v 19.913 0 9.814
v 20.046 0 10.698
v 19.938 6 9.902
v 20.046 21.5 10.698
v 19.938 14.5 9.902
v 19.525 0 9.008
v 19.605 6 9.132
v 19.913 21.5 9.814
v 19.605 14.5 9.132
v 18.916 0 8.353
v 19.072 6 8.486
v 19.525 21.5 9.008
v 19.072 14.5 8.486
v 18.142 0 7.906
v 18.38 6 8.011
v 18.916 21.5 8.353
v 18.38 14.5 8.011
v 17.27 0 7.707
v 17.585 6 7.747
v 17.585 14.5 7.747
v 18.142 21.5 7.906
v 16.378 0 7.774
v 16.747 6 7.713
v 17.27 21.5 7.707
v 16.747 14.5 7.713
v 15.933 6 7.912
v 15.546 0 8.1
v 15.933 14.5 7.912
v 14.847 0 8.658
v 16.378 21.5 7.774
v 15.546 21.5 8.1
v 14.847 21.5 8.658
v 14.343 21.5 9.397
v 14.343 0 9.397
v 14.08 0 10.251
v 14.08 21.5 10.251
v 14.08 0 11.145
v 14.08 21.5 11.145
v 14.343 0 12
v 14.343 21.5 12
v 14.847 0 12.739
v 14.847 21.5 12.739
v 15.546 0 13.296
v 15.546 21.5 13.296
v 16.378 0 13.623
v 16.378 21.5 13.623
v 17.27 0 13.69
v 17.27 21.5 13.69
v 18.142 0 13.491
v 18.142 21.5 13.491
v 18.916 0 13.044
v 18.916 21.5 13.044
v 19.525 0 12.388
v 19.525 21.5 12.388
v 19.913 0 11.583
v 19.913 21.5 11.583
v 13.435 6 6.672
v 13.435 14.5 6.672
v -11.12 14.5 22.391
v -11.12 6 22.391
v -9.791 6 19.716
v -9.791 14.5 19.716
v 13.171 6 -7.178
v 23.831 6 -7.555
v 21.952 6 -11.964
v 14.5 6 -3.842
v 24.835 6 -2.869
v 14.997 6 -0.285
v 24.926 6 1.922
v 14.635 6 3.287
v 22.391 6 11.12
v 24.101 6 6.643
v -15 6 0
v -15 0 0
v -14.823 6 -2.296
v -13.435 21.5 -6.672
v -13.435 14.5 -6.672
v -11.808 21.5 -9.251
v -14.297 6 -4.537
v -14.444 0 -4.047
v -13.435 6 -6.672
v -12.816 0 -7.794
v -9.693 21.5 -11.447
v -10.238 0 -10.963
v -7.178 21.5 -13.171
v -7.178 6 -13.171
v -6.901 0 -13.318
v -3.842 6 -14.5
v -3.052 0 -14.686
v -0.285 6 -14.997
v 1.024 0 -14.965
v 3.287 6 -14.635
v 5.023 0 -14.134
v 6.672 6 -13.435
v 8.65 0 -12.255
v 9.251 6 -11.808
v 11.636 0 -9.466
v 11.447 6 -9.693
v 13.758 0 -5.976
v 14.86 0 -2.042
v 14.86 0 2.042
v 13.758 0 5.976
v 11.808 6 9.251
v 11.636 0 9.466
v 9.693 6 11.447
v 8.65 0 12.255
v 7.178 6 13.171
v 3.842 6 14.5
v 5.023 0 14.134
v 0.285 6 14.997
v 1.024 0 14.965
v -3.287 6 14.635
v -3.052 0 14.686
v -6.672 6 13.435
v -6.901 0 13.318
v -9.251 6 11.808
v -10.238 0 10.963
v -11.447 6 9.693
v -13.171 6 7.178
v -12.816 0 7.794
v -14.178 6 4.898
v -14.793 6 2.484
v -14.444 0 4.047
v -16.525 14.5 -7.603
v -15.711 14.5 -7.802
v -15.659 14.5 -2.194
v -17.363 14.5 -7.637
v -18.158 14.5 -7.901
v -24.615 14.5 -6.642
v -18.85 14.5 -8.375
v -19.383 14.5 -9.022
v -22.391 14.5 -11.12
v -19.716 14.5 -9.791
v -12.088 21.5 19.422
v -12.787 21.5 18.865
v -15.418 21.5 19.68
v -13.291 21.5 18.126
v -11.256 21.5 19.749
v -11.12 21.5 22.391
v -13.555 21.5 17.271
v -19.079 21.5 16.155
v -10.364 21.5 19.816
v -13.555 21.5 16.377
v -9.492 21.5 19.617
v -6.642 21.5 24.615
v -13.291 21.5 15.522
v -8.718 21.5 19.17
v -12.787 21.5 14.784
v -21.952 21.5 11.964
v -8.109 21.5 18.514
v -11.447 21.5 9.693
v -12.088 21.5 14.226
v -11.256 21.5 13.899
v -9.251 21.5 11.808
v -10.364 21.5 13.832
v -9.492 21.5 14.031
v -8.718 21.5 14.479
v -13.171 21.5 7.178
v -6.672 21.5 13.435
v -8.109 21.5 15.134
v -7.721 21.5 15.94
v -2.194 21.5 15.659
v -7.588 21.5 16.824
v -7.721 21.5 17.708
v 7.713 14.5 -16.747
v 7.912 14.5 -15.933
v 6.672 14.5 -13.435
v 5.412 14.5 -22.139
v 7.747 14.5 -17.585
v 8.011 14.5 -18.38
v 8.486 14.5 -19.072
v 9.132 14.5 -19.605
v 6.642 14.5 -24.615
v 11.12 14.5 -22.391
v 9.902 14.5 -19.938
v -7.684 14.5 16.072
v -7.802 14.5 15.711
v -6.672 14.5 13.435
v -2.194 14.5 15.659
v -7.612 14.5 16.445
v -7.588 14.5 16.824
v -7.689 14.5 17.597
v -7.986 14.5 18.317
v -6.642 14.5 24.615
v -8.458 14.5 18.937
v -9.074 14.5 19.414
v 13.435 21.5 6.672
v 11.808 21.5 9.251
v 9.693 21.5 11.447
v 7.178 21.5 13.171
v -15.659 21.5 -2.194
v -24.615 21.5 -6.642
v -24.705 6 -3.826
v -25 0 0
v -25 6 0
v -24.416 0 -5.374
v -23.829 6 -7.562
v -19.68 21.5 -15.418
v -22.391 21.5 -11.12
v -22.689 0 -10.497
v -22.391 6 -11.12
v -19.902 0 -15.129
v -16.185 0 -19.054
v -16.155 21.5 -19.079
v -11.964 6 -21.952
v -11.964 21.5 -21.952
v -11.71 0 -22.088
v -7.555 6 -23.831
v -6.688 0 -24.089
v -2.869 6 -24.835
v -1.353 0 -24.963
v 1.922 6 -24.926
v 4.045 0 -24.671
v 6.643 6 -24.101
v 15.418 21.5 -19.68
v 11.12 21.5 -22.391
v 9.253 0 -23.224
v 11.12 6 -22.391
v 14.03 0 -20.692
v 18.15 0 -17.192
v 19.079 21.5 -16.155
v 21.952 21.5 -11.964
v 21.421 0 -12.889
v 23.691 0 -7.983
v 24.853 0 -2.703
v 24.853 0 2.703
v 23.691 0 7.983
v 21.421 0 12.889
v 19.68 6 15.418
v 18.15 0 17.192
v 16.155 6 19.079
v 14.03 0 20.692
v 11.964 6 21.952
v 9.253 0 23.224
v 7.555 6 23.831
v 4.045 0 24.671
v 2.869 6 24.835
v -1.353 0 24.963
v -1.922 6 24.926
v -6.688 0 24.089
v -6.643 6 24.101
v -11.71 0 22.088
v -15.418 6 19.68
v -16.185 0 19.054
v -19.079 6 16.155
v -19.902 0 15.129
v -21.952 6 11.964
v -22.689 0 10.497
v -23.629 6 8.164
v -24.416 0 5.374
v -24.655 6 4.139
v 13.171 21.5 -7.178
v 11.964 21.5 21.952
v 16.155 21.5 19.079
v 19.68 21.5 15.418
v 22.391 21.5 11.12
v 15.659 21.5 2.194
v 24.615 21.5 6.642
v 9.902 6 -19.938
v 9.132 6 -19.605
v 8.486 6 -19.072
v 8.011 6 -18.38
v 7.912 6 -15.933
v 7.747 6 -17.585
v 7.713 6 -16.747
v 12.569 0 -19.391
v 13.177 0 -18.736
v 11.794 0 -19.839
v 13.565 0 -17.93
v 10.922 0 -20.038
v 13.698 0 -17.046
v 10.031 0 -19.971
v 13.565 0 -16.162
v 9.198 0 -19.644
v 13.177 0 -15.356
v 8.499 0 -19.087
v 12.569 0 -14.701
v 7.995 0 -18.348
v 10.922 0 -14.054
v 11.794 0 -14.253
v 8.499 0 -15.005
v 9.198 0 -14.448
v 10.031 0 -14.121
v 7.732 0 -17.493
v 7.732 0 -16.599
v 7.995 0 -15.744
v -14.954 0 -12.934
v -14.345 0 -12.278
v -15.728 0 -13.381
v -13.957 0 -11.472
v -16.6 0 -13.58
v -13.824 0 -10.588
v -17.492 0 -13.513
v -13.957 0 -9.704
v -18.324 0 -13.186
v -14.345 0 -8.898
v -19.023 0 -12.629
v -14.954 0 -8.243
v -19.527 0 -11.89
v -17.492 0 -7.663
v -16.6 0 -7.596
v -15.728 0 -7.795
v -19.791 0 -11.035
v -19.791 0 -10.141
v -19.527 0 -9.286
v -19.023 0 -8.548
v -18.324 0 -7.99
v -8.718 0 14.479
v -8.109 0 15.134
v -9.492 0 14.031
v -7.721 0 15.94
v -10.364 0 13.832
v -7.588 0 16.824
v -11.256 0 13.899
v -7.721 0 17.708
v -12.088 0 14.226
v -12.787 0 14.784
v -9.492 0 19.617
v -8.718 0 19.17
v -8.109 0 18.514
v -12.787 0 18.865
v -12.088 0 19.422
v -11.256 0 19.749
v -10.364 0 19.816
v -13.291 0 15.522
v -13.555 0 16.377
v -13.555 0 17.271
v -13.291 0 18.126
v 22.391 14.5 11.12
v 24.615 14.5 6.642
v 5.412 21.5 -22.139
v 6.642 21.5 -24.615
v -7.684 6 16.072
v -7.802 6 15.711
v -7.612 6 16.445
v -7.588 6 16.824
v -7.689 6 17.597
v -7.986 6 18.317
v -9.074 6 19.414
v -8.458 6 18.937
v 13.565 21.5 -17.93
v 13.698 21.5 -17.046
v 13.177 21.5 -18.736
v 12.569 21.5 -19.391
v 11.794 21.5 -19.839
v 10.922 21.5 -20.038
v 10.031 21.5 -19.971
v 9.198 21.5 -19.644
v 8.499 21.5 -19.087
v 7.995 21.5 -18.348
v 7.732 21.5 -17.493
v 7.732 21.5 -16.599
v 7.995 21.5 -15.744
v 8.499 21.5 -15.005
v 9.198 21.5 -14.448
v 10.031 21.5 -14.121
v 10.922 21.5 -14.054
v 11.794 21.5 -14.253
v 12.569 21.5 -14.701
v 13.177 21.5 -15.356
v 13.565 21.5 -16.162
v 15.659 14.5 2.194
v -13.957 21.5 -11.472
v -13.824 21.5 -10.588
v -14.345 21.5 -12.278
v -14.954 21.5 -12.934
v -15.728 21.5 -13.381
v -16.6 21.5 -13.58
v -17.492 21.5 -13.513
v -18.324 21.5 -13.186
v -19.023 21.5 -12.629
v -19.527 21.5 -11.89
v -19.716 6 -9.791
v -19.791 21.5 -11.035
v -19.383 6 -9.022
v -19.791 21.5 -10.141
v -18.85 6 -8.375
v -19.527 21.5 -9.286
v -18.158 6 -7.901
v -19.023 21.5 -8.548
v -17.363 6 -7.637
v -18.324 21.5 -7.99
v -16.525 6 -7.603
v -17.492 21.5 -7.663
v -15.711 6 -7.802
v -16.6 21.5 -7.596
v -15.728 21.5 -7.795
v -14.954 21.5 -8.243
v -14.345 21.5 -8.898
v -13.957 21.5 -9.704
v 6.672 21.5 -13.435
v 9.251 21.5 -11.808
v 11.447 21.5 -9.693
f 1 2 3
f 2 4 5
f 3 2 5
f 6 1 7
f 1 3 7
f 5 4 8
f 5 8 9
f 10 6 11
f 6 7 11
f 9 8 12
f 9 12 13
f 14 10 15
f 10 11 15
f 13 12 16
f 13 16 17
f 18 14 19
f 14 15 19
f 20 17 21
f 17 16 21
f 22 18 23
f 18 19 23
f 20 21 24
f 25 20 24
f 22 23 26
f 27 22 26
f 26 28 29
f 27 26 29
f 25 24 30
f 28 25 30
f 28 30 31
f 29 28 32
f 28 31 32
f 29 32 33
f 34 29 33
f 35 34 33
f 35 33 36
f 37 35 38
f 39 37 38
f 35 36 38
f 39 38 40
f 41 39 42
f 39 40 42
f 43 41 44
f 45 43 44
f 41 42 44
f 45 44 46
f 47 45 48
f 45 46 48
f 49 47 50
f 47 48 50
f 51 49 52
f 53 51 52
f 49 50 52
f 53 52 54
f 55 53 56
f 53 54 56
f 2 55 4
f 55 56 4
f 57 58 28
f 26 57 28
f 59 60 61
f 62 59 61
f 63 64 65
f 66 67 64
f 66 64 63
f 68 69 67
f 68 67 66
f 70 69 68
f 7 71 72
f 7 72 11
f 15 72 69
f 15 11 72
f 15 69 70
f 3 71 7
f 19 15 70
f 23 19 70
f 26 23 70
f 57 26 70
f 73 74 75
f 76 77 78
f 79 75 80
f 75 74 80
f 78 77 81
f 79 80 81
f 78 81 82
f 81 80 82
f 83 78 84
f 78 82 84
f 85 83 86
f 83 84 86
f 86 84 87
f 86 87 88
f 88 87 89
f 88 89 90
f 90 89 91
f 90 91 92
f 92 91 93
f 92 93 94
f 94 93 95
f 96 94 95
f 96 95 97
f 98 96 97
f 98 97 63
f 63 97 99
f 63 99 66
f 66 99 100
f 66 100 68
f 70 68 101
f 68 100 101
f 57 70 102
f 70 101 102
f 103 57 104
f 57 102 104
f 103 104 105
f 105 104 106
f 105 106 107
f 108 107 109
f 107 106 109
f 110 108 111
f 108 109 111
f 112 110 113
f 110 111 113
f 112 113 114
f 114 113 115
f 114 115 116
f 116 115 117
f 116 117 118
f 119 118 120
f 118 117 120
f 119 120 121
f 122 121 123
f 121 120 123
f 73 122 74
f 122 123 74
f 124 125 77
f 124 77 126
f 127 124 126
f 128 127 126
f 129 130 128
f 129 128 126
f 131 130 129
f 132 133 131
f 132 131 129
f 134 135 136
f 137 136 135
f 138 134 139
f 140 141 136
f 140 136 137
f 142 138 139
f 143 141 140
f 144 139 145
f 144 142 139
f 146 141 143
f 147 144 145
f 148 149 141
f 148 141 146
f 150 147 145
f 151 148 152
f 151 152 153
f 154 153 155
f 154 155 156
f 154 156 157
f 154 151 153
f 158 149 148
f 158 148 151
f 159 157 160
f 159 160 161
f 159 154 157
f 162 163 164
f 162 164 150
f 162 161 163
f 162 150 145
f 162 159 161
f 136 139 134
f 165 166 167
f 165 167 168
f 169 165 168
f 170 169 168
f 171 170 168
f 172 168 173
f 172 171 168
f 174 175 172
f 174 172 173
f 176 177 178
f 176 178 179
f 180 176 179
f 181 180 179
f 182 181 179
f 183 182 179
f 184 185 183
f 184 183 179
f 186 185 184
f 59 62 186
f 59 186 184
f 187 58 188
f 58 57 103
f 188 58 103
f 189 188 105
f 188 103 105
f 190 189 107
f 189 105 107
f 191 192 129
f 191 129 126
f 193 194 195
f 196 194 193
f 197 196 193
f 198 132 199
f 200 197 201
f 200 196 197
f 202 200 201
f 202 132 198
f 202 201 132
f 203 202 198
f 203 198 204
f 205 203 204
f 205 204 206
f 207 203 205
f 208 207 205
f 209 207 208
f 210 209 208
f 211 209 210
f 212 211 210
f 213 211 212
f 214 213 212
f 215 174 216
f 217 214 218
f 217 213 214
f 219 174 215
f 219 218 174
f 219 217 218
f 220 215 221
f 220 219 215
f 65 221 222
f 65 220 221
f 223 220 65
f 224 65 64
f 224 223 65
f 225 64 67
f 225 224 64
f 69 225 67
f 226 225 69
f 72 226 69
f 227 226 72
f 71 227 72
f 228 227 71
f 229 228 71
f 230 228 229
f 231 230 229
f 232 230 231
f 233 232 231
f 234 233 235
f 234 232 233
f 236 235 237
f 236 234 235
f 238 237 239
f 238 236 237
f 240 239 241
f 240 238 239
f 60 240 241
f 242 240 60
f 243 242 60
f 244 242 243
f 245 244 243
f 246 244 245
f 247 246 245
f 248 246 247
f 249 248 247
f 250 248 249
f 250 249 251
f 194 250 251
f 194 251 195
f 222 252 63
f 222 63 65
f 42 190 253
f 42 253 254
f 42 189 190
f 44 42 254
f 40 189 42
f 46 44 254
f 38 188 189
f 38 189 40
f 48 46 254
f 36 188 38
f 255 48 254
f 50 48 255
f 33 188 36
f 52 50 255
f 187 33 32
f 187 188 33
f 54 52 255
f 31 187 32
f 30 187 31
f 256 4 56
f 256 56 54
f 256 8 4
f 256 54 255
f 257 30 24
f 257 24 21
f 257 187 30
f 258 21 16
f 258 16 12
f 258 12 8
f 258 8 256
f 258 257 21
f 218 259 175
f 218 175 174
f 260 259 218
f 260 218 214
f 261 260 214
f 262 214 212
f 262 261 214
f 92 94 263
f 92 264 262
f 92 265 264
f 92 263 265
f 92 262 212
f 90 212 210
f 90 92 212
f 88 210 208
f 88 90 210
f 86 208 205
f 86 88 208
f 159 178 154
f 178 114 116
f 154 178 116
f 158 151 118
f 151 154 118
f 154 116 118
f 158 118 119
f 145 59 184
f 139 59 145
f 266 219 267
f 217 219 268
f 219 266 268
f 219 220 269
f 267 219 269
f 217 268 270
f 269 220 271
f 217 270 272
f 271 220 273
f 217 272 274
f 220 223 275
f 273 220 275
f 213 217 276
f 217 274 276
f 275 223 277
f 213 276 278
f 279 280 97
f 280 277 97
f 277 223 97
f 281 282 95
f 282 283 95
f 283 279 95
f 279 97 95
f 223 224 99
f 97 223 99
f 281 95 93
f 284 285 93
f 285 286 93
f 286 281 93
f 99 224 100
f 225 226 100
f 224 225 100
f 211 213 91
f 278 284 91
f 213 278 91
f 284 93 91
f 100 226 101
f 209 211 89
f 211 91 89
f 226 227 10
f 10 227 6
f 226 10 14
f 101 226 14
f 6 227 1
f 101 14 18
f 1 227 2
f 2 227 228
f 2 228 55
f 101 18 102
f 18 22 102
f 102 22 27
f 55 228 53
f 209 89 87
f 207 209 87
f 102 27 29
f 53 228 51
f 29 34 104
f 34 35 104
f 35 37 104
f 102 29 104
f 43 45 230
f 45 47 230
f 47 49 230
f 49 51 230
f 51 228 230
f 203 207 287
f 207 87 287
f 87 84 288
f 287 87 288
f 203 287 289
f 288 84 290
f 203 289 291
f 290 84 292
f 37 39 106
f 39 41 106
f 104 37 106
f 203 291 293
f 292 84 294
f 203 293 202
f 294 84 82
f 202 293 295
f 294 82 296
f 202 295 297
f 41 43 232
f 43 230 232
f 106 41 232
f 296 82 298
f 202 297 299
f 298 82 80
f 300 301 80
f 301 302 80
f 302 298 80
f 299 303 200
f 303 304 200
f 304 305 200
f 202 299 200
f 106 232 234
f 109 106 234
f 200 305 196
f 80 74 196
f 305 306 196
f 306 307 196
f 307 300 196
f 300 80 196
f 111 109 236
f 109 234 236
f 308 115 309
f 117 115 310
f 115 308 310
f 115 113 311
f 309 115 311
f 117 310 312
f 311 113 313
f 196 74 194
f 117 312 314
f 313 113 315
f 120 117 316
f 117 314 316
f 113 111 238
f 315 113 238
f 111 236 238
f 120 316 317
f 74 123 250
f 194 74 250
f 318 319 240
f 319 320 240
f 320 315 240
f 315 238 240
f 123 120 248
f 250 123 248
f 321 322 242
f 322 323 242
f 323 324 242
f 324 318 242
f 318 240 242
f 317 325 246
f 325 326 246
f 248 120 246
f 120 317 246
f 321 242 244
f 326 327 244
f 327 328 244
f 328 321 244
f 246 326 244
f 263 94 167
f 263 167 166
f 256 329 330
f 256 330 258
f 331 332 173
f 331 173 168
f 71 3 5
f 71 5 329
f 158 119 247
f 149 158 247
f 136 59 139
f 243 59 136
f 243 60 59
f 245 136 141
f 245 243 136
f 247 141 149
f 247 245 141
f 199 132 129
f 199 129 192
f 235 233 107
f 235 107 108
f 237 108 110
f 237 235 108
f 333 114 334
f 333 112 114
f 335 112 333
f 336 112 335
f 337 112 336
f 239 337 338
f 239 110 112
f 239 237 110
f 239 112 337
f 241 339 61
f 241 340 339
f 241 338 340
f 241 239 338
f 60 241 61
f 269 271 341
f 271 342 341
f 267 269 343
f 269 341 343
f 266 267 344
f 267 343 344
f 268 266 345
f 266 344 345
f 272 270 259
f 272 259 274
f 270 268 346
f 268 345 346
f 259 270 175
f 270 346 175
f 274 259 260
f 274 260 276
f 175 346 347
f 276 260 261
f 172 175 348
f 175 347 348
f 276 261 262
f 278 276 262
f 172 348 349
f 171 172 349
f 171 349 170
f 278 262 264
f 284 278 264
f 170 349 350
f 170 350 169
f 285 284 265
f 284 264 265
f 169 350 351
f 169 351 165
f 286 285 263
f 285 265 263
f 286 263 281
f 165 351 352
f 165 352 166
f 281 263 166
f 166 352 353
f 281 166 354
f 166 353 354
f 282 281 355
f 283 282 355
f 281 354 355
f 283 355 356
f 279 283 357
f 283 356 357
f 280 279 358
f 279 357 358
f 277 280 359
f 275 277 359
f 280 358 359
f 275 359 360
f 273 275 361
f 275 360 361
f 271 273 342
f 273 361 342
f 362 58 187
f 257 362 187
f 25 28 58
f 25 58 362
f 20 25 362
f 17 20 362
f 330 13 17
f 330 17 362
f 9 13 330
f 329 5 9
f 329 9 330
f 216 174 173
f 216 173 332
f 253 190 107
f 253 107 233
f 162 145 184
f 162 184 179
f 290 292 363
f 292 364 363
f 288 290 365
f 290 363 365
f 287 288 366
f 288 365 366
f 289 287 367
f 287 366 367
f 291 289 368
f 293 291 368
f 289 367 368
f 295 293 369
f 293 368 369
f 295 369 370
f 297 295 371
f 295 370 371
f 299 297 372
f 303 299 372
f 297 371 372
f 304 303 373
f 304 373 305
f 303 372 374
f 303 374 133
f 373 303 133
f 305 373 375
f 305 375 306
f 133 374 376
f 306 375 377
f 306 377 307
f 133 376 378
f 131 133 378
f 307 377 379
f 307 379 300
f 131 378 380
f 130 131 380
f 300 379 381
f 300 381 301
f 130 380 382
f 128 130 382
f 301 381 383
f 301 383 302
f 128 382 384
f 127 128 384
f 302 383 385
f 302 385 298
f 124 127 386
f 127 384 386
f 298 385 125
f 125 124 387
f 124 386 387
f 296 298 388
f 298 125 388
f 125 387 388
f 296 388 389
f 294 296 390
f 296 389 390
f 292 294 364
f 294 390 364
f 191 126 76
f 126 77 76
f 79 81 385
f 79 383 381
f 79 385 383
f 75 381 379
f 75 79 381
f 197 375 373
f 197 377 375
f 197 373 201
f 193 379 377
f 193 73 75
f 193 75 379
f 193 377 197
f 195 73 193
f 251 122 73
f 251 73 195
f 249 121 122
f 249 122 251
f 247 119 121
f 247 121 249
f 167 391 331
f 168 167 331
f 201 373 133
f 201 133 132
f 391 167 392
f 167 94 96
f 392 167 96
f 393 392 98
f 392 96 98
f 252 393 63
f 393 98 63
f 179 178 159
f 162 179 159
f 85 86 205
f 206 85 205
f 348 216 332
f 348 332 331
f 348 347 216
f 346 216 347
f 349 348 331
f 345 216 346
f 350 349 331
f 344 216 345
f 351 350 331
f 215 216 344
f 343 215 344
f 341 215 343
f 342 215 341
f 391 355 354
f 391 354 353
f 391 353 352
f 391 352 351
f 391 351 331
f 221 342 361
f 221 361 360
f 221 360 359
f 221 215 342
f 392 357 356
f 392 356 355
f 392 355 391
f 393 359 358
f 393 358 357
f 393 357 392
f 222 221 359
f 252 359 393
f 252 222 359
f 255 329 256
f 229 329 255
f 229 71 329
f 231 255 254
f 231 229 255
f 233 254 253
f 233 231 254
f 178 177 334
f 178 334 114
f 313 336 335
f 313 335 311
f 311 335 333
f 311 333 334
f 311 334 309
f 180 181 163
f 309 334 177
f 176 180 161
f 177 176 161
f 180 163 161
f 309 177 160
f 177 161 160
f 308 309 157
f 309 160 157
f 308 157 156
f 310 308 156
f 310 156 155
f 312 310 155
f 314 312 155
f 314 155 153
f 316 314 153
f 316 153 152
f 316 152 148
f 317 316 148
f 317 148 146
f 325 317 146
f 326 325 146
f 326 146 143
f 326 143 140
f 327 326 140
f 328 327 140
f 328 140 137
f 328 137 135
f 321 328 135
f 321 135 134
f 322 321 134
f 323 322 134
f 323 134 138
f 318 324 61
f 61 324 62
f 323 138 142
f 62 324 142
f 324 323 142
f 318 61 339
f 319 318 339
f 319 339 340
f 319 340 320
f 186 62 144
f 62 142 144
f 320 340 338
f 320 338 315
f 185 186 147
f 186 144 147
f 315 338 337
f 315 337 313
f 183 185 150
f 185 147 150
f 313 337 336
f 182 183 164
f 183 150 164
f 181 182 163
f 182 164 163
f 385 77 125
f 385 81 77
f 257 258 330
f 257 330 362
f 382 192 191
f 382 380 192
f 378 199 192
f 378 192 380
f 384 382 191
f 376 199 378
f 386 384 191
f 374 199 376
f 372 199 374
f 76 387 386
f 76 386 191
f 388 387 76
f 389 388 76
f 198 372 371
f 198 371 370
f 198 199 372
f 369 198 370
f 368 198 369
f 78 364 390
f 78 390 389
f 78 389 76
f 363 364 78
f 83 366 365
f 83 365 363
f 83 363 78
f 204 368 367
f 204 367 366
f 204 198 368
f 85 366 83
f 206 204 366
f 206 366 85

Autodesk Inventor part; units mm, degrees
ref_plane "YZ Plane" through (0, 0, 0) normal (1, 0, 0) x (0, 1, 0)
ref_plane "XZ Plane" through (0, 0, 0) normal (0, 1, 0) x (-1, 0, 0)
ref_plane "XY Plane" through (0, 0, 0) normal (0, 0, 1) x (1, 0, 0)
sketch "Sketch1" plane through (0, 0, 0) normal (0, 1, 0) x (-1, 0, 0)
  circle A0 centre (0, 0) radius 25
  circle A1 centre (0, 0) radius 15
  dimension "d0" = 50
  dimension "d1" = 30
extrude "Extrusion1" add sketch "Sketch1" along normal blind 6
sketch "Sketch2" plane through (0, 6, 0) normal (0, 1, 0) x (1, 0, 0)
  arc A0 (-6.6718, -13.4346) -> (-7.1782, 13.1709) centre (0, 0) ccw
  arc A1 (-21.9516, -11.9636) -> (-11.1196, -22.3909) centre (0, 0) ccw
  line L0 (-13.1709, -7.1782) -> (-21.9516, -11.9636)
  line L1 (-13.4346, 6.6718) -> (-22.3909, 11.1196)
  line L2 (-7.1782, 13.1709) -> (-11.9636, 21.9516)
  circle A2 centre (0, 0) radius 15 projected
  line L3 (6.6718, 13.4346) -> (11.1196, 22.3909)
  circle A3 centre (0, 0) radius 25 projected
  line L4 (13.1709, 7.1782) -> (21.9516, 11.9636)
  line L5 (-11.1196, -22.3909) -> (-6.6718, -13.4346)
  line L6 (7.1782, -13.1709) -> (11.9636, -21.9516)
  line L7 (13.4346, -6.6718) -> (22.3909, -11.1196)
  arc A4 (-22.3909, 11.1196) -> (-21.9516, -11.9636) centre (0, 0) ccw
  arc A5 (-11.1196, -22.3909) -> (21.9516, 11.9636) centre (0, 0) ccw
  arc A6 (-11.9636, 21.9516) -> (-22.3909, 11.1196) centre (0, 0) ccw
  arc A7 (11.1196, 22.3909) -> (-11.9636, 21.9516) centre (0, 0) ccw
  arc A8 (21.9516, 11.9636) -> (11.1196, 22.3909) centre (0, 0) ccw
  arc A9 (-13.1709, -7.1782) -> (-6.6718, -13.4346) centre (0, 0) ccw
  arc A10 (-13.4346, 6.6718) -> (-13.1709, -7.1782) centre (0, 0) ccw
  arc A11 (-7.1782, 13.1709) -> (-13.4346, 6.6718) centre (0, 0) ccw
  dimension "d6" = 35
  dimension "d7" = 35
  dimension "d8" = 35
  dimension "d9" = 35
  dimension "d10" = 55
  dimension "d11" = 55
  dimension "d12" = 55
  dimension "d13" = 55
extrude "Extrusion2" add sketch "Sketch2" along normal blind 15.5 contours L5 A1 L0 A2 | A0 L7 A3 L6 | L1 A3 L2 A2 | A0 L3 A3 L4
sketch "Sketch3" plane through (11.9636, 6, 21.9516) normal (-0.8781, 0, 0.4785) x (0.4785, 0, 0.8781)
  line L0 (-10, 15.5) -> (0, 15.5)
  line L1 (0, 15.5) -> (0, 9)
  line L2 (0, 9) -> (-10, 9)
  line L3 (-10, 9) -> (-10, 15.5)
  point P0 (-25, -6)
  dimension "d18" = 6.5
  dimension "d21" = 10
sketch "Sketch4" plane through (-21.9516, 6, 11.9636) normal (-0.4785, 0, -0.8781) x (-0.8781, 0, 0.4785)
  line L0 (0, 0) -> (0, 15.5) projected
  line L1 (-10, 15.5) -> (0, 15.5)
  line L2 (0, 15.5) -> (0, 9)
  line L3 (0, 9) -> (-10, 9)
  line L4 (-10, 9) -> (-10, 15.5)
  point P0 (-25, -6)
  dimension "d20" = 6.5
sketch "Sketch5" plane through (-11.9636, 6, -21.9516) normal (0.8781, 0, -0.4785) x (-0.4785, 0, -0.8781)
  line L0 (0, 0) -> (0, 15.5) projected
  line L1 (-10, 15.5) -> (0, 15.5)
  line L2 (0, 15.5) -> (0, 9)
  line L3 (0, 9) -> (-10, 9)
  line L4 (-10, 9) -> (-10, 15.5)
  point P0 (-25, -6)
  dimension "d19" = 6.5
sketch "Sketch6" plane through (21.9516, 6, -11.9636) normal (0.4785, 0, 0.8781) x (0.8781, 0, -0.4785)
  point P0 (-25, -6)
sketch "Sketch7" plane through (21.9516, 6, -11.9636) normal (0.4785, 0, 0.8781) x (0.8781, 0, -0.4785)
  line L0 (0, 0) -> (0, 15.5) projected
  line L1 (-10, 15.5) -> (0, 15.5)
  line L2 (0, 15.5) -> (0, 9)
  line L3 (0, 9) -> (-10, 9)
  line L4 (-10, 9) -> (-10, 15.5)
  point P0 (-25, -6)
  dimension "d17" = 6.5
sketch "Sketch12" plane through (-6.6718, 6, 13.4346) normal (0.8956, 0, 0.4448) x (0.4448, 0, -0.8956)
  line L0 (0, 0) -> (0, 15.5) projected
  line L1 (-10, 15.5) -> (0, 15.5)
  line L2 (0, 15.5) -> (0, 8.5)
  line L3 (0, 8.5) -> (-10, 8.5)
  line L4 (-10, 8.5) -> (-10, 15.5)
  point P0 (15, -6)
  dimension "d55" = 7
sketch "Sketch13" plane through (13.4346, 6, 6.6718) normal (0.4448, 0, -0.8956) x (-0.8956, 0, -0.4448)
  line L0 (0, 0) -> (0, 15.5) projected
  line L1 (-10, 15.5) -> (0, 15.5)
  line L2 (0, 15.5) -> (0, 8.5)
  line L3 (0, 8.5) -> (-10, 8.5)
  line L4 (-10, 8.5) -> (-10, 15.5)
  point P0 (15, -6)
  dimension "d56" = 7
sketch "Sketch14" plane through (6.6718, 6, -13.4346) normal (-0.8956, 0, -0.4448) x (-0.4448, 0, 0.8956)
  line L0 (-10, 15.5) -> (0, 15.5)
  line L1 (0, 15.5) -> (0, 8.5)
  line L2 (0, 8.5) -> (-10, 8.5)
  line L3 (-10, 8.5) -> (-10, 15.5)
  point P0 (15, -6)
  dimension "d57" = 7
sketch "Sketch15" plane through (-13.4346, 6, -6.6718) normal (-0.4448, 0, 0.8956) x (0.8956, 0, 0.4448)
  line L0 (0, 0) -> (0, 15.5) projected
  line L1 (-10, 15.5) -> (0, 15.5)
  line L2 (0, 15.5) -> (0, 8.5)
  line L3 (0, 8.5) -> (-10, 8.5)
  line L4 (-10, 8.5) -> (-10, 15.5)
  point P0 (15, -6)
  dimension "d58" = 7
extrude "Extrusion11" add sketch "Sketch12" along normal blind 5
extrude "Extrusion12" add sketch "Sketch13" along normal blind 5
sketch "Sketch16" plane through (6.6718, 6, -13.4346) normal (-0.8956, 0, -0.4448) x (-0.4448, 0, 0.8956)
  point P0 (15, -6)
extrude "Extrusion13" add sketch "Sketch14" along normal blind 5
extrude "Extrusion14" add sketch "Sketch15" along normal blind 5
sketch "Sketch8" plane through (0, 21.5, 0) normal (0, 1, 0) x (1, 0, 0)
  circle A0 centre (-16.8241, 10.5881) radius 3
  arc A1 (-7.1782, 13.1709) -> (-13.4346, 6.6718) centre (0, 0) ccw projected
  line L0 (-7.5733, 24.3443) -> (-2.7879, 15.5637) projected
  arc A2 (-11.9636, 21.9516) -> (-22.3909, 11.1196) centre (0, 0) ccw projected
  circle A3 centre (0, 0) radius 25 projected
  line L1 (-22.3909, 11.1196) -> (-13.4346, 6.6718) projected
  line L2 (-15.6585, 2.1936) -> (-24.6149, 6.6414) projected
  line L3 (-16.8241, 10.5881) -> (-12.6951, 7.9896) construction
  dimension "d30" = 6
  dimension "d71" = 7
  dimension "d72" = 4.129
sketch "Sketch9" plane through (0, 21.5, 0) normal (0, 1, 0) x (1, 0, 0)
  circle A0 centre (10.6983, 17.046) radius 3
  line L0 (24.3443, 7.5733) -> (15.5637, 2.7879) construction
  arc A1 (21.9516, 11.9636) -> (11.1196, 22.3909) centre (0, 0) ccw construction
  line L1 (11.1196, 22.3909) -> (6.6718, 13.4346) projected
  line L2 (2.1936, 15.6585) -> (6.6414, 24.6149) projected
  line L3 (10.6983, 17.046) -> (13.2898, 21.175) construction
  dimension "d37" = 6
  dimension "d73" = 7
  dimension "d77" = 4.129
sketch "Sketch10" plane through (0, 21.5, 0) normal (0, 1, 0) x (1, 0, 0)
  circle A0 centre (17.046, -10.6983) radius 3
  line L0 (7.5733, -24.3443) -> (2.7879, -15.5637) projected
  arc A1 (11.9636, -21.9516) -> (22.3909, -11.1196) centre (0, 0) ccw construction
  line L1 (22.3909, -11.1196) -> (13.4346, -6.6718) projected
  line L2 (15.6585, -2.1936) -> (24.6149, -6.6414) projected
  line L3 (17.046, -10.6983) -> (21.175, -13.2898) construction
  dimension "d42" = 6
  dimension "d78" = 7
  dimension "d79" = 4.129
sketch "Sketch11" plane through (0, 21.5, 0) normal (0, 1, 0) x (1, 0, 0)
  circle A0 centre (-10.5881, -16.8241) radius 3
  line L0 (-24.3443, -7.5733) -> (-15.5637, -2.7879) projected
  arc A1 (-13.1709, -7.1782) -> (-6.6718, -13.4346) centre (0, 0) ccw construction
  line L1 (-11.1196, -22.3909) -> (-6.6718, -13.4346) projected
  line L2 (-2.1936, -15.6585) -> (-6.6414, -24.6149) projected
  line L3 (-10.5881, -16.8241) -> (-7.9896, -12.6951) construction
  dimension "d44" = 6
  dimension "d80" = 7
  dimension "d83" = 4.129
extrude "Extrusion15" cut sketch "Sketch8" against normal through all contours A0 L1 | L1 A0
extrude "Extrusion16" cut sketch "Sketch9" against normal through all
extrude "Extrusion17" cut sketch "Sketch10" against normal through all
extrude "Extrusion18" cut sketch "Sketch11" against normal through all
sketch "Sketch17" plane through (0, 21.5, 0) normal (0, 1, 0) x (1, 0, 0)
  line L0 (2.1936, 15.6585) -> (6.6414, 24.6149) projected
  line L1 (6.6718, 13.4346) -> (2.1936, 15.6585)
  line L2 (2.1936, 15.6585) -> (4.4175, 20.1367)
  line L3 (6.6718, 13.4346) -> (5.4119, 22.139)
  point P0 (0, 0)
extrude "Extrusion19" cut sketch "Sketch17" against normal blind 8
properties part number "male bayonet connector - mk2"
